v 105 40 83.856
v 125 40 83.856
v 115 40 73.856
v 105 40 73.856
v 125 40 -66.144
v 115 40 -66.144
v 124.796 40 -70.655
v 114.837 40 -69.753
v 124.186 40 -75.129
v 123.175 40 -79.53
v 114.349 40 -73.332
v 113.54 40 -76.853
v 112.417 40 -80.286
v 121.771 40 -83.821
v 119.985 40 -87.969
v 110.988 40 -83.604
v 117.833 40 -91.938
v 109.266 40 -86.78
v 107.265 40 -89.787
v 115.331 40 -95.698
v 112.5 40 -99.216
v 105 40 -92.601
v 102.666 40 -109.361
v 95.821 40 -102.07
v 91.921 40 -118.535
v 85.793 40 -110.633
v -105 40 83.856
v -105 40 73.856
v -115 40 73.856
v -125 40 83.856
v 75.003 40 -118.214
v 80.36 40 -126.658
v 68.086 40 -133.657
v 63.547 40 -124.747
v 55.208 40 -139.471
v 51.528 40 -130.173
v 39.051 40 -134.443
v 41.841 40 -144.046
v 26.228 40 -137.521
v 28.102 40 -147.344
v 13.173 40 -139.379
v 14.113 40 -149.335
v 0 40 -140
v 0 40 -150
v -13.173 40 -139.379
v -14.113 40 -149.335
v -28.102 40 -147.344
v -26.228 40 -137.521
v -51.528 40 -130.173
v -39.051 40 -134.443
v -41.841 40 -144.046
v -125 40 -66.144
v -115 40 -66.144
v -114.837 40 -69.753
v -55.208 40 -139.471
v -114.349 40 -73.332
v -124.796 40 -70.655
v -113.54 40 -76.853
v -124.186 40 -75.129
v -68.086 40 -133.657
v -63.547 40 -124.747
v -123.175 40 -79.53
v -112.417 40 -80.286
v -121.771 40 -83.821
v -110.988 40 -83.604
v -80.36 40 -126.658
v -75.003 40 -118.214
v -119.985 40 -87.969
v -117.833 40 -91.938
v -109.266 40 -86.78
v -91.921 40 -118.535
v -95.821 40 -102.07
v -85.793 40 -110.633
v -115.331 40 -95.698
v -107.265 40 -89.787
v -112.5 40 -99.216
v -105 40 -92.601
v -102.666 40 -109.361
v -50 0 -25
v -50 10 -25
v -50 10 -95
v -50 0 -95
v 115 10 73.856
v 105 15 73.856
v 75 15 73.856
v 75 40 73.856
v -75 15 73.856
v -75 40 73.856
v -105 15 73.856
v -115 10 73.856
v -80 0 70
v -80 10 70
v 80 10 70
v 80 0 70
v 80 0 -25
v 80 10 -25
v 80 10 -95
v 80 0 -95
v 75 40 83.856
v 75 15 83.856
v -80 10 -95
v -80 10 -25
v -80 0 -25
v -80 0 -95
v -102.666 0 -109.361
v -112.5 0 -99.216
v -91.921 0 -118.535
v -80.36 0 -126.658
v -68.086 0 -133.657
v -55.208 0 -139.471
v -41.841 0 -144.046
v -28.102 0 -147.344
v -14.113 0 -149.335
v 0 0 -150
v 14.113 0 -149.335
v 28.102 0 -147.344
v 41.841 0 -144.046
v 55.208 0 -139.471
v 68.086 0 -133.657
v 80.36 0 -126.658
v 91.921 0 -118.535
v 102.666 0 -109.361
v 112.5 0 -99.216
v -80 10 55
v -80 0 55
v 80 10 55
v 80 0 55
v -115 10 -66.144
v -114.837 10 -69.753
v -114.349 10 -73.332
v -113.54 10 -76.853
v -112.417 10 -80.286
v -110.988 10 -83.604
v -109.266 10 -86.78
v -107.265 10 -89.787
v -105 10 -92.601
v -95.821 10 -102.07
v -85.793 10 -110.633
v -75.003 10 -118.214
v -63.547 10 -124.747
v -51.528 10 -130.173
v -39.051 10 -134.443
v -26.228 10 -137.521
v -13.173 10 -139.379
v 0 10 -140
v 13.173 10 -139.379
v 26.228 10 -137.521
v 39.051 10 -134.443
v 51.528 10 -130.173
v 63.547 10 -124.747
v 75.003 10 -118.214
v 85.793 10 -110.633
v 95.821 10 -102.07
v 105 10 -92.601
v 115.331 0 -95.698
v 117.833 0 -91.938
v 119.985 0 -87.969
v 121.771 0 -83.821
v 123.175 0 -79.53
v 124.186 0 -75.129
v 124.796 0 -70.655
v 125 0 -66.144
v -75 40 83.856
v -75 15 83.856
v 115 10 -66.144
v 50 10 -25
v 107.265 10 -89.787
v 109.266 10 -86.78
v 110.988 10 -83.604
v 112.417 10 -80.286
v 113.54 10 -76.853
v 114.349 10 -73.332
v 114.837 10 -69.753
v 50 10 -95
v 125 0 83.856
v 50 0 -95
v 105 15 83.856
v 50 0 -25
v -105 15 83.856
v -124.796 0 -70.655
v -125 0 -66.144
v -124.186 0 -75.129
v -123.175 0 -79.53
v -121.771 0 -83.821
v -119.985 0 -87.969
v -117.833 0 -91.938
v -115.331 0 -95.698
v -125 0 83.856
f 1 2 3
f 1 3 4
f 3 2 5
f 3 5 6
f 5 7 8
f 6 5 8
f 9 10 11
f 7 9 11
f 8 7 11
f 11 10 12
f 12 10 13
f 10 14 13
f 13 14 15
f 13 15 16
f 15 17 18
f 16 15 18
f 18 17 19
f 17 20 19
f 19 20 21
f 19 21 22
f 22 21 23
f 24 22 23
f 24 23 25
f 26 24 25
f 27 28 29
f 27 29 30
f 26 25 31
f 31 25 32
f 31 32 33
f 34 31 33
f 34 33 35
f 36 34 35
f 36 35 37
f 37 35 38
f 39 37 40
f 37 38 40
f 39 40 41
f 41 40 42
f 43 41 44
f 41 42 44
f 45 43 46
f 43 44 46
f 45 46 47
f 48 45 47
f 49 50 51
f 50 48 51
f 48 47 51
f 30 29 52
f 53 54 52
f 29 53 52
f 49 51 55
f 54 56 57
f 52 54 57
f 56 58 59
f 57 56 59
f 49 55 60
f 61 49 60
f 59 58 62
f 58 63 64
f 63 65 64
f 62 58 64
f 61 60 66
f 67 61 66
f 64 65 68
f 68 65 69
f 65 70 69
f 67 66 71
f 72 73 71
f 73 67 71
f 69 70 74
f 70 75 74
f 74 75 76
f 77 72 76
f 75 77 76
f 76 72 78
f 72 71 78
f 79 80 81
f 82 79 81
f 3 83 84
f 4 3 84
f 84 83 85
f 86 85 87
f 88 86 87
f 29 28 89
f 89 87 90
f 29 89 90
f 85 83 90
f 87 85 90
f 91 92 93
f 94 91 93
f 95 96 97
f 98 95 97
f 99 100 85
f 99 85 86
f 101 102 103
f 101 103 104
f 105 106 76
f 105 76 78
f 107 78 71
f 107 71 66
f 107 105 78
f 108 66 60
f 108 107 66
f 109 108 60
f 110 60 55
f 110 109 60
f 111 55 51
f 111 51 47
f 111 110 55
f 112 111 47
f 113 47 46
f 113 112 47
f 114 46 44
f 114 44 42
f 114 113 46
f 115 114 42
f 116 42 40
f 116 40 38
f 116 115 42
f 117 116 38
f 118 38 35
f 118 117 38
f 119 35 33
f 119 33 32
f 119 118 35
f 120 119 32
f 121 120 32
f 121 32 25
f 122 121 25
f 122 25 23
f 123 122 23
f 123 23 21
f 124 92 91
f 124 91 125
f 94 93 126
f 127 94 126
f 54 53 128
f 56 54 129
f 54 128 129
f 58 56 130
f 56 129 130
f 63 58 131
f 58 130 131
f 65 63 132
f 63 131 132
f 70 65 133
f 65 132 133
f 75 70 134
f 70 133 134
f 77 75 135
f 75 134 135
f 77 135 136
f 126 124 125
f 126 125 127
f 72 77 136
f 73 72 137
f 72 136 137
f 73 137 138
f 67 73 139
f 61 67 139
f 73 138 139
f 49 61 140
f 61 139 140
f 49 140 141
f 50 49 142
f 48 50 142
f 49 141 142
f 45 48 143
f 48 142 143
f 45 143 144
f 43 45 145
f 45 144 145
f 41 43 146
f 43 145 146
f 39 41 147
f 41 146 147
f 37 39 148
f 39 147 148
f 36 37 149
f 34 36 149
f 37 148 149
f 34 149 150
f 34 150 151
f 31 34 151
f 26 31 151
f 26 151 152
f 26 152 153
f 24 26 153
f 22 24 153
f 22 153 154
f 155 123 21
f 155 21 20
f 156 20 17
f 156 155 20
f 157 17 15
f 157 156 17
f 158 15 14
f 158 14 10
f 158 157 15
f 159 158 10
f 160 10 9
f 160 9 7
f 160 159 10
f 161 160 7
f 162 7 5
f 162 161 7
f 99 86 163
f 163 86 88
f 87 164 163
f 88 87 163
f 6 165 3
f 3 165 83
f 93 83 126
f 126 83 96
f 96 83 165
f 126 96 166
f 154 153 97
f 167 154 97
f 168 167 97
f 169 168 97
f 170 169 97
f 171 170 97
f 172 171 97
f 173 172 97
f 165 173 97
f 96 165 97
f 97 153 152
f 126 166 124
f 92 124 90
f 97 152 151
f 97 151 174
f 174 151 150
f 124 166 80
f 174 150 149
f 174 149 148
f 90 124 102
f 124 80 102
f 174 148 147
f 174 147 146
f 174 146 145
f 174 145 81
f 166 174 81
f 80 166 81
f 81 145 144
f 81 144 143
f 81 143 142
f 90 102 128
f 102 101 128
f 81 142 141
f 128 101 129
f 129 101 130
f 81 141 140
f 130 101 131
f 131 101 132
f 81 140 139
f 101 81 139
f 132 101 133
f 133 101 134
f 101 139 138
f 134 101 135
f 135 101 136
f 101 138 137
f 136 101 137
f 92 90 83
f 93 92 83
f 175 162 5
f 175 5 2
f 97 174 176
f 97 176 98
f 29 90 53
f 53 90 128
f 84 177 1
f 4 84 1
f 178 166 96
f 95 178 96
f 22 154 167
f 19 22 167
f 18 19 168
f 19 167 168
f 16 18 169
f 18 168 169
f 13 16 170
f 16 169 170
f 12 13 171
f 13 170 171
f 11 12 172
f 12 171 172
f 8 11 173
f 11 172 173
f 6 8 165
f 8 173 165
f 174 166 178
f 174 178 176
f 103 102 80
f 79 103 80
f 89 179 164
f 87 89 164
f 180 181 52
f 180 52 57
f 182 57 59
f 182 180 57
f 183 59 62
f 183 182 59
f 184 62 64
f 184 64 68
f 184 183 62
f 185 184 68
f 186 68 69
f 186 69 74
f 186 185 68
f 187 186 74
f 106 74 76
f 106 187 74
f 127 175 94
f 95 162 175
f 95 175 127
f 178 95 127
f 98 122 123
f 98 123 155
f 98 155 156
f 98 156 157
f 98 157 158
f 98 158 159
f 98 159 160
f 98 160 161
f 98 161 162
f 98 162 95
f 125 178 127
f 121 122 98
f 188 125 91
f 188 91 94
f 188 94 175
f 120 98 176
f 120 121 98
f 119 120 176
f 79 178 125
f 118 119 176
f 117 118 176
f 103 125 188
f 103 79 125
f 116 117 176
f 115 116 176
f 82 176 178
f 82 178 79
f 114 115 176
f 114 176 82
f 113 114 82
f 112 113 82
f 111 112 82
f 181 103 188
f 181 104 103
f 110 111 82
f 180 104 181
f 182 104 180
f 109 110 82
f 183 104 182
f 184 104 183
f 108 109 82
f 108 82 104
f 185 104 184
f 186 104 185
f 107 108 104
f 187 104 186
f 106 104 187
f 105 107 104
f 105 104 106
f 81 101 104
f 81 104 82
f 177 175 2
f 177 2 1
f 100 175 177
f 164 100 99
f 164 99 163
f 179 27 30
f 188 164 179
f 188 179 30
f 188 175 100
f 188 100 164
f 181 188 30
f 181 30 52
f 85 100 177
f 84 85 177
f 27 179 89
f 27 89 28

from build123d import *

# Parameters (mm, degrees)
BOSS_EXTRUDE1_DEPTH = 40
SHELL1_T            = -10
SKETCH2_W           = 30
SKETCH2_H           = 70
SKETCH2_W_2         = 160
SKETCH2_H_2         = 15
CUT_EXTRUDE1_DEPTH  = 198.547462651
CUT_EXTRUDE2_REACH  = 270.167
SKETCH3_W           = 30
SKETCH3_H           = 50


with BuildPart() as part:
    # Sketch1 → Boss-Extrude1 (new body)
    with BuildSketch(Plane(origin=(0, 0, 0), x_dir=(1, 0, 0), z_dir=(0, 1, 0))):
        with BuildLine():
            Line((125, 66.143782777), (125, -83.856217223))
            Line((125, -83.856217223), (-125, -83.856217223))
            Line((-125, -83.856217223), (-125, 66.143782777))
            ThreePointArc((-125, 66.143782777), (-121.770717335, 83.821452306), (-112.5, 99.215674165))
            ThreePointArc((-112.5, 99.215674165), (0, 150), (112.5, 99.215674165))
            ThreePointArc((112.5, 99.215674165), (121.770717335, 83.821452306), (125, 66.143782777))
        make_face()
    extrude(amount=BOSS_EXTRUDE1_DEPTH)

    # Shell1
    shell1_openings = [part.faces().sort_by_distance(p)[0] for p in [
        (0, 40, -23.901312182),
    ]]
    offset(amount=SHELL1_T, openings=shell1_openings, kind=Kind.INTERSECTION)

    # Sketch2 → Cut-Extrude1 (cut, through all)
    with BuildSketch(Plane(origin=(0, 10, 0), x_dir=(1, 0, 0), z_dir=(0, 1, 0))):
        with Locations((-65, 60)):
            Rectangle(SKETCH2_W, SKETCH2_H)
        with Locations((65, 60)):
            Rectangle(SKETCH2_W, SKETCH2_H)
        with Locations((0, -62.5)):
            Rectangle(SKETCH2_W_2, SKETCH2_H_2)
    extrude(amount=-CUT_EXTRUDE1_DEPTH, mode=Mode.SUBTRACT)

    # Sketch3 → Cut-Extrude2 (cut, up to next)
    with BuildSketch(Plane.XY.offset(83.856217223), mode=Mode.PRIVATE) as cut_extrude2_sk1:
        with Locations((-90, 40)):
            Rectangle(SKETCH3_W, SKETCH3_H)
    cut_extrude2_tool1 = extrude(cut_extrude2_sk1.sketch, amount=-CUT_EXTRUDE2_REACH, mode=Mode.PRIVATE) & part.part
    # Sketch3 → Cut-Extrude2 (cut, up to next)
    with BuildSketch(Plane.XY.offset(83.856217223), mode=Mode.PRIVATE) as cut_extrude2_sk2:
        with Locations((90, 40)):
            Rectangle(SKETCH3_W, SKETCH3_H)
    cut_extrude2_tool2 = extrude(cut_extrude2_sk2.sketch, amount=-CUT_EXTRUDE2_REACH, mode=Mode.PRIVATE) & part.part
    add(cut_extrude2_tool1.solids().sort_by_distance((-90, 40, 83.856217))[0], mode=Mode.SUBTRACT)
    add(cut_extrude2_tool2.solids().sort_by_distance((90, 40, 83.856217))[0], mode=Mode.SUBTRACT)


solid = part.part
